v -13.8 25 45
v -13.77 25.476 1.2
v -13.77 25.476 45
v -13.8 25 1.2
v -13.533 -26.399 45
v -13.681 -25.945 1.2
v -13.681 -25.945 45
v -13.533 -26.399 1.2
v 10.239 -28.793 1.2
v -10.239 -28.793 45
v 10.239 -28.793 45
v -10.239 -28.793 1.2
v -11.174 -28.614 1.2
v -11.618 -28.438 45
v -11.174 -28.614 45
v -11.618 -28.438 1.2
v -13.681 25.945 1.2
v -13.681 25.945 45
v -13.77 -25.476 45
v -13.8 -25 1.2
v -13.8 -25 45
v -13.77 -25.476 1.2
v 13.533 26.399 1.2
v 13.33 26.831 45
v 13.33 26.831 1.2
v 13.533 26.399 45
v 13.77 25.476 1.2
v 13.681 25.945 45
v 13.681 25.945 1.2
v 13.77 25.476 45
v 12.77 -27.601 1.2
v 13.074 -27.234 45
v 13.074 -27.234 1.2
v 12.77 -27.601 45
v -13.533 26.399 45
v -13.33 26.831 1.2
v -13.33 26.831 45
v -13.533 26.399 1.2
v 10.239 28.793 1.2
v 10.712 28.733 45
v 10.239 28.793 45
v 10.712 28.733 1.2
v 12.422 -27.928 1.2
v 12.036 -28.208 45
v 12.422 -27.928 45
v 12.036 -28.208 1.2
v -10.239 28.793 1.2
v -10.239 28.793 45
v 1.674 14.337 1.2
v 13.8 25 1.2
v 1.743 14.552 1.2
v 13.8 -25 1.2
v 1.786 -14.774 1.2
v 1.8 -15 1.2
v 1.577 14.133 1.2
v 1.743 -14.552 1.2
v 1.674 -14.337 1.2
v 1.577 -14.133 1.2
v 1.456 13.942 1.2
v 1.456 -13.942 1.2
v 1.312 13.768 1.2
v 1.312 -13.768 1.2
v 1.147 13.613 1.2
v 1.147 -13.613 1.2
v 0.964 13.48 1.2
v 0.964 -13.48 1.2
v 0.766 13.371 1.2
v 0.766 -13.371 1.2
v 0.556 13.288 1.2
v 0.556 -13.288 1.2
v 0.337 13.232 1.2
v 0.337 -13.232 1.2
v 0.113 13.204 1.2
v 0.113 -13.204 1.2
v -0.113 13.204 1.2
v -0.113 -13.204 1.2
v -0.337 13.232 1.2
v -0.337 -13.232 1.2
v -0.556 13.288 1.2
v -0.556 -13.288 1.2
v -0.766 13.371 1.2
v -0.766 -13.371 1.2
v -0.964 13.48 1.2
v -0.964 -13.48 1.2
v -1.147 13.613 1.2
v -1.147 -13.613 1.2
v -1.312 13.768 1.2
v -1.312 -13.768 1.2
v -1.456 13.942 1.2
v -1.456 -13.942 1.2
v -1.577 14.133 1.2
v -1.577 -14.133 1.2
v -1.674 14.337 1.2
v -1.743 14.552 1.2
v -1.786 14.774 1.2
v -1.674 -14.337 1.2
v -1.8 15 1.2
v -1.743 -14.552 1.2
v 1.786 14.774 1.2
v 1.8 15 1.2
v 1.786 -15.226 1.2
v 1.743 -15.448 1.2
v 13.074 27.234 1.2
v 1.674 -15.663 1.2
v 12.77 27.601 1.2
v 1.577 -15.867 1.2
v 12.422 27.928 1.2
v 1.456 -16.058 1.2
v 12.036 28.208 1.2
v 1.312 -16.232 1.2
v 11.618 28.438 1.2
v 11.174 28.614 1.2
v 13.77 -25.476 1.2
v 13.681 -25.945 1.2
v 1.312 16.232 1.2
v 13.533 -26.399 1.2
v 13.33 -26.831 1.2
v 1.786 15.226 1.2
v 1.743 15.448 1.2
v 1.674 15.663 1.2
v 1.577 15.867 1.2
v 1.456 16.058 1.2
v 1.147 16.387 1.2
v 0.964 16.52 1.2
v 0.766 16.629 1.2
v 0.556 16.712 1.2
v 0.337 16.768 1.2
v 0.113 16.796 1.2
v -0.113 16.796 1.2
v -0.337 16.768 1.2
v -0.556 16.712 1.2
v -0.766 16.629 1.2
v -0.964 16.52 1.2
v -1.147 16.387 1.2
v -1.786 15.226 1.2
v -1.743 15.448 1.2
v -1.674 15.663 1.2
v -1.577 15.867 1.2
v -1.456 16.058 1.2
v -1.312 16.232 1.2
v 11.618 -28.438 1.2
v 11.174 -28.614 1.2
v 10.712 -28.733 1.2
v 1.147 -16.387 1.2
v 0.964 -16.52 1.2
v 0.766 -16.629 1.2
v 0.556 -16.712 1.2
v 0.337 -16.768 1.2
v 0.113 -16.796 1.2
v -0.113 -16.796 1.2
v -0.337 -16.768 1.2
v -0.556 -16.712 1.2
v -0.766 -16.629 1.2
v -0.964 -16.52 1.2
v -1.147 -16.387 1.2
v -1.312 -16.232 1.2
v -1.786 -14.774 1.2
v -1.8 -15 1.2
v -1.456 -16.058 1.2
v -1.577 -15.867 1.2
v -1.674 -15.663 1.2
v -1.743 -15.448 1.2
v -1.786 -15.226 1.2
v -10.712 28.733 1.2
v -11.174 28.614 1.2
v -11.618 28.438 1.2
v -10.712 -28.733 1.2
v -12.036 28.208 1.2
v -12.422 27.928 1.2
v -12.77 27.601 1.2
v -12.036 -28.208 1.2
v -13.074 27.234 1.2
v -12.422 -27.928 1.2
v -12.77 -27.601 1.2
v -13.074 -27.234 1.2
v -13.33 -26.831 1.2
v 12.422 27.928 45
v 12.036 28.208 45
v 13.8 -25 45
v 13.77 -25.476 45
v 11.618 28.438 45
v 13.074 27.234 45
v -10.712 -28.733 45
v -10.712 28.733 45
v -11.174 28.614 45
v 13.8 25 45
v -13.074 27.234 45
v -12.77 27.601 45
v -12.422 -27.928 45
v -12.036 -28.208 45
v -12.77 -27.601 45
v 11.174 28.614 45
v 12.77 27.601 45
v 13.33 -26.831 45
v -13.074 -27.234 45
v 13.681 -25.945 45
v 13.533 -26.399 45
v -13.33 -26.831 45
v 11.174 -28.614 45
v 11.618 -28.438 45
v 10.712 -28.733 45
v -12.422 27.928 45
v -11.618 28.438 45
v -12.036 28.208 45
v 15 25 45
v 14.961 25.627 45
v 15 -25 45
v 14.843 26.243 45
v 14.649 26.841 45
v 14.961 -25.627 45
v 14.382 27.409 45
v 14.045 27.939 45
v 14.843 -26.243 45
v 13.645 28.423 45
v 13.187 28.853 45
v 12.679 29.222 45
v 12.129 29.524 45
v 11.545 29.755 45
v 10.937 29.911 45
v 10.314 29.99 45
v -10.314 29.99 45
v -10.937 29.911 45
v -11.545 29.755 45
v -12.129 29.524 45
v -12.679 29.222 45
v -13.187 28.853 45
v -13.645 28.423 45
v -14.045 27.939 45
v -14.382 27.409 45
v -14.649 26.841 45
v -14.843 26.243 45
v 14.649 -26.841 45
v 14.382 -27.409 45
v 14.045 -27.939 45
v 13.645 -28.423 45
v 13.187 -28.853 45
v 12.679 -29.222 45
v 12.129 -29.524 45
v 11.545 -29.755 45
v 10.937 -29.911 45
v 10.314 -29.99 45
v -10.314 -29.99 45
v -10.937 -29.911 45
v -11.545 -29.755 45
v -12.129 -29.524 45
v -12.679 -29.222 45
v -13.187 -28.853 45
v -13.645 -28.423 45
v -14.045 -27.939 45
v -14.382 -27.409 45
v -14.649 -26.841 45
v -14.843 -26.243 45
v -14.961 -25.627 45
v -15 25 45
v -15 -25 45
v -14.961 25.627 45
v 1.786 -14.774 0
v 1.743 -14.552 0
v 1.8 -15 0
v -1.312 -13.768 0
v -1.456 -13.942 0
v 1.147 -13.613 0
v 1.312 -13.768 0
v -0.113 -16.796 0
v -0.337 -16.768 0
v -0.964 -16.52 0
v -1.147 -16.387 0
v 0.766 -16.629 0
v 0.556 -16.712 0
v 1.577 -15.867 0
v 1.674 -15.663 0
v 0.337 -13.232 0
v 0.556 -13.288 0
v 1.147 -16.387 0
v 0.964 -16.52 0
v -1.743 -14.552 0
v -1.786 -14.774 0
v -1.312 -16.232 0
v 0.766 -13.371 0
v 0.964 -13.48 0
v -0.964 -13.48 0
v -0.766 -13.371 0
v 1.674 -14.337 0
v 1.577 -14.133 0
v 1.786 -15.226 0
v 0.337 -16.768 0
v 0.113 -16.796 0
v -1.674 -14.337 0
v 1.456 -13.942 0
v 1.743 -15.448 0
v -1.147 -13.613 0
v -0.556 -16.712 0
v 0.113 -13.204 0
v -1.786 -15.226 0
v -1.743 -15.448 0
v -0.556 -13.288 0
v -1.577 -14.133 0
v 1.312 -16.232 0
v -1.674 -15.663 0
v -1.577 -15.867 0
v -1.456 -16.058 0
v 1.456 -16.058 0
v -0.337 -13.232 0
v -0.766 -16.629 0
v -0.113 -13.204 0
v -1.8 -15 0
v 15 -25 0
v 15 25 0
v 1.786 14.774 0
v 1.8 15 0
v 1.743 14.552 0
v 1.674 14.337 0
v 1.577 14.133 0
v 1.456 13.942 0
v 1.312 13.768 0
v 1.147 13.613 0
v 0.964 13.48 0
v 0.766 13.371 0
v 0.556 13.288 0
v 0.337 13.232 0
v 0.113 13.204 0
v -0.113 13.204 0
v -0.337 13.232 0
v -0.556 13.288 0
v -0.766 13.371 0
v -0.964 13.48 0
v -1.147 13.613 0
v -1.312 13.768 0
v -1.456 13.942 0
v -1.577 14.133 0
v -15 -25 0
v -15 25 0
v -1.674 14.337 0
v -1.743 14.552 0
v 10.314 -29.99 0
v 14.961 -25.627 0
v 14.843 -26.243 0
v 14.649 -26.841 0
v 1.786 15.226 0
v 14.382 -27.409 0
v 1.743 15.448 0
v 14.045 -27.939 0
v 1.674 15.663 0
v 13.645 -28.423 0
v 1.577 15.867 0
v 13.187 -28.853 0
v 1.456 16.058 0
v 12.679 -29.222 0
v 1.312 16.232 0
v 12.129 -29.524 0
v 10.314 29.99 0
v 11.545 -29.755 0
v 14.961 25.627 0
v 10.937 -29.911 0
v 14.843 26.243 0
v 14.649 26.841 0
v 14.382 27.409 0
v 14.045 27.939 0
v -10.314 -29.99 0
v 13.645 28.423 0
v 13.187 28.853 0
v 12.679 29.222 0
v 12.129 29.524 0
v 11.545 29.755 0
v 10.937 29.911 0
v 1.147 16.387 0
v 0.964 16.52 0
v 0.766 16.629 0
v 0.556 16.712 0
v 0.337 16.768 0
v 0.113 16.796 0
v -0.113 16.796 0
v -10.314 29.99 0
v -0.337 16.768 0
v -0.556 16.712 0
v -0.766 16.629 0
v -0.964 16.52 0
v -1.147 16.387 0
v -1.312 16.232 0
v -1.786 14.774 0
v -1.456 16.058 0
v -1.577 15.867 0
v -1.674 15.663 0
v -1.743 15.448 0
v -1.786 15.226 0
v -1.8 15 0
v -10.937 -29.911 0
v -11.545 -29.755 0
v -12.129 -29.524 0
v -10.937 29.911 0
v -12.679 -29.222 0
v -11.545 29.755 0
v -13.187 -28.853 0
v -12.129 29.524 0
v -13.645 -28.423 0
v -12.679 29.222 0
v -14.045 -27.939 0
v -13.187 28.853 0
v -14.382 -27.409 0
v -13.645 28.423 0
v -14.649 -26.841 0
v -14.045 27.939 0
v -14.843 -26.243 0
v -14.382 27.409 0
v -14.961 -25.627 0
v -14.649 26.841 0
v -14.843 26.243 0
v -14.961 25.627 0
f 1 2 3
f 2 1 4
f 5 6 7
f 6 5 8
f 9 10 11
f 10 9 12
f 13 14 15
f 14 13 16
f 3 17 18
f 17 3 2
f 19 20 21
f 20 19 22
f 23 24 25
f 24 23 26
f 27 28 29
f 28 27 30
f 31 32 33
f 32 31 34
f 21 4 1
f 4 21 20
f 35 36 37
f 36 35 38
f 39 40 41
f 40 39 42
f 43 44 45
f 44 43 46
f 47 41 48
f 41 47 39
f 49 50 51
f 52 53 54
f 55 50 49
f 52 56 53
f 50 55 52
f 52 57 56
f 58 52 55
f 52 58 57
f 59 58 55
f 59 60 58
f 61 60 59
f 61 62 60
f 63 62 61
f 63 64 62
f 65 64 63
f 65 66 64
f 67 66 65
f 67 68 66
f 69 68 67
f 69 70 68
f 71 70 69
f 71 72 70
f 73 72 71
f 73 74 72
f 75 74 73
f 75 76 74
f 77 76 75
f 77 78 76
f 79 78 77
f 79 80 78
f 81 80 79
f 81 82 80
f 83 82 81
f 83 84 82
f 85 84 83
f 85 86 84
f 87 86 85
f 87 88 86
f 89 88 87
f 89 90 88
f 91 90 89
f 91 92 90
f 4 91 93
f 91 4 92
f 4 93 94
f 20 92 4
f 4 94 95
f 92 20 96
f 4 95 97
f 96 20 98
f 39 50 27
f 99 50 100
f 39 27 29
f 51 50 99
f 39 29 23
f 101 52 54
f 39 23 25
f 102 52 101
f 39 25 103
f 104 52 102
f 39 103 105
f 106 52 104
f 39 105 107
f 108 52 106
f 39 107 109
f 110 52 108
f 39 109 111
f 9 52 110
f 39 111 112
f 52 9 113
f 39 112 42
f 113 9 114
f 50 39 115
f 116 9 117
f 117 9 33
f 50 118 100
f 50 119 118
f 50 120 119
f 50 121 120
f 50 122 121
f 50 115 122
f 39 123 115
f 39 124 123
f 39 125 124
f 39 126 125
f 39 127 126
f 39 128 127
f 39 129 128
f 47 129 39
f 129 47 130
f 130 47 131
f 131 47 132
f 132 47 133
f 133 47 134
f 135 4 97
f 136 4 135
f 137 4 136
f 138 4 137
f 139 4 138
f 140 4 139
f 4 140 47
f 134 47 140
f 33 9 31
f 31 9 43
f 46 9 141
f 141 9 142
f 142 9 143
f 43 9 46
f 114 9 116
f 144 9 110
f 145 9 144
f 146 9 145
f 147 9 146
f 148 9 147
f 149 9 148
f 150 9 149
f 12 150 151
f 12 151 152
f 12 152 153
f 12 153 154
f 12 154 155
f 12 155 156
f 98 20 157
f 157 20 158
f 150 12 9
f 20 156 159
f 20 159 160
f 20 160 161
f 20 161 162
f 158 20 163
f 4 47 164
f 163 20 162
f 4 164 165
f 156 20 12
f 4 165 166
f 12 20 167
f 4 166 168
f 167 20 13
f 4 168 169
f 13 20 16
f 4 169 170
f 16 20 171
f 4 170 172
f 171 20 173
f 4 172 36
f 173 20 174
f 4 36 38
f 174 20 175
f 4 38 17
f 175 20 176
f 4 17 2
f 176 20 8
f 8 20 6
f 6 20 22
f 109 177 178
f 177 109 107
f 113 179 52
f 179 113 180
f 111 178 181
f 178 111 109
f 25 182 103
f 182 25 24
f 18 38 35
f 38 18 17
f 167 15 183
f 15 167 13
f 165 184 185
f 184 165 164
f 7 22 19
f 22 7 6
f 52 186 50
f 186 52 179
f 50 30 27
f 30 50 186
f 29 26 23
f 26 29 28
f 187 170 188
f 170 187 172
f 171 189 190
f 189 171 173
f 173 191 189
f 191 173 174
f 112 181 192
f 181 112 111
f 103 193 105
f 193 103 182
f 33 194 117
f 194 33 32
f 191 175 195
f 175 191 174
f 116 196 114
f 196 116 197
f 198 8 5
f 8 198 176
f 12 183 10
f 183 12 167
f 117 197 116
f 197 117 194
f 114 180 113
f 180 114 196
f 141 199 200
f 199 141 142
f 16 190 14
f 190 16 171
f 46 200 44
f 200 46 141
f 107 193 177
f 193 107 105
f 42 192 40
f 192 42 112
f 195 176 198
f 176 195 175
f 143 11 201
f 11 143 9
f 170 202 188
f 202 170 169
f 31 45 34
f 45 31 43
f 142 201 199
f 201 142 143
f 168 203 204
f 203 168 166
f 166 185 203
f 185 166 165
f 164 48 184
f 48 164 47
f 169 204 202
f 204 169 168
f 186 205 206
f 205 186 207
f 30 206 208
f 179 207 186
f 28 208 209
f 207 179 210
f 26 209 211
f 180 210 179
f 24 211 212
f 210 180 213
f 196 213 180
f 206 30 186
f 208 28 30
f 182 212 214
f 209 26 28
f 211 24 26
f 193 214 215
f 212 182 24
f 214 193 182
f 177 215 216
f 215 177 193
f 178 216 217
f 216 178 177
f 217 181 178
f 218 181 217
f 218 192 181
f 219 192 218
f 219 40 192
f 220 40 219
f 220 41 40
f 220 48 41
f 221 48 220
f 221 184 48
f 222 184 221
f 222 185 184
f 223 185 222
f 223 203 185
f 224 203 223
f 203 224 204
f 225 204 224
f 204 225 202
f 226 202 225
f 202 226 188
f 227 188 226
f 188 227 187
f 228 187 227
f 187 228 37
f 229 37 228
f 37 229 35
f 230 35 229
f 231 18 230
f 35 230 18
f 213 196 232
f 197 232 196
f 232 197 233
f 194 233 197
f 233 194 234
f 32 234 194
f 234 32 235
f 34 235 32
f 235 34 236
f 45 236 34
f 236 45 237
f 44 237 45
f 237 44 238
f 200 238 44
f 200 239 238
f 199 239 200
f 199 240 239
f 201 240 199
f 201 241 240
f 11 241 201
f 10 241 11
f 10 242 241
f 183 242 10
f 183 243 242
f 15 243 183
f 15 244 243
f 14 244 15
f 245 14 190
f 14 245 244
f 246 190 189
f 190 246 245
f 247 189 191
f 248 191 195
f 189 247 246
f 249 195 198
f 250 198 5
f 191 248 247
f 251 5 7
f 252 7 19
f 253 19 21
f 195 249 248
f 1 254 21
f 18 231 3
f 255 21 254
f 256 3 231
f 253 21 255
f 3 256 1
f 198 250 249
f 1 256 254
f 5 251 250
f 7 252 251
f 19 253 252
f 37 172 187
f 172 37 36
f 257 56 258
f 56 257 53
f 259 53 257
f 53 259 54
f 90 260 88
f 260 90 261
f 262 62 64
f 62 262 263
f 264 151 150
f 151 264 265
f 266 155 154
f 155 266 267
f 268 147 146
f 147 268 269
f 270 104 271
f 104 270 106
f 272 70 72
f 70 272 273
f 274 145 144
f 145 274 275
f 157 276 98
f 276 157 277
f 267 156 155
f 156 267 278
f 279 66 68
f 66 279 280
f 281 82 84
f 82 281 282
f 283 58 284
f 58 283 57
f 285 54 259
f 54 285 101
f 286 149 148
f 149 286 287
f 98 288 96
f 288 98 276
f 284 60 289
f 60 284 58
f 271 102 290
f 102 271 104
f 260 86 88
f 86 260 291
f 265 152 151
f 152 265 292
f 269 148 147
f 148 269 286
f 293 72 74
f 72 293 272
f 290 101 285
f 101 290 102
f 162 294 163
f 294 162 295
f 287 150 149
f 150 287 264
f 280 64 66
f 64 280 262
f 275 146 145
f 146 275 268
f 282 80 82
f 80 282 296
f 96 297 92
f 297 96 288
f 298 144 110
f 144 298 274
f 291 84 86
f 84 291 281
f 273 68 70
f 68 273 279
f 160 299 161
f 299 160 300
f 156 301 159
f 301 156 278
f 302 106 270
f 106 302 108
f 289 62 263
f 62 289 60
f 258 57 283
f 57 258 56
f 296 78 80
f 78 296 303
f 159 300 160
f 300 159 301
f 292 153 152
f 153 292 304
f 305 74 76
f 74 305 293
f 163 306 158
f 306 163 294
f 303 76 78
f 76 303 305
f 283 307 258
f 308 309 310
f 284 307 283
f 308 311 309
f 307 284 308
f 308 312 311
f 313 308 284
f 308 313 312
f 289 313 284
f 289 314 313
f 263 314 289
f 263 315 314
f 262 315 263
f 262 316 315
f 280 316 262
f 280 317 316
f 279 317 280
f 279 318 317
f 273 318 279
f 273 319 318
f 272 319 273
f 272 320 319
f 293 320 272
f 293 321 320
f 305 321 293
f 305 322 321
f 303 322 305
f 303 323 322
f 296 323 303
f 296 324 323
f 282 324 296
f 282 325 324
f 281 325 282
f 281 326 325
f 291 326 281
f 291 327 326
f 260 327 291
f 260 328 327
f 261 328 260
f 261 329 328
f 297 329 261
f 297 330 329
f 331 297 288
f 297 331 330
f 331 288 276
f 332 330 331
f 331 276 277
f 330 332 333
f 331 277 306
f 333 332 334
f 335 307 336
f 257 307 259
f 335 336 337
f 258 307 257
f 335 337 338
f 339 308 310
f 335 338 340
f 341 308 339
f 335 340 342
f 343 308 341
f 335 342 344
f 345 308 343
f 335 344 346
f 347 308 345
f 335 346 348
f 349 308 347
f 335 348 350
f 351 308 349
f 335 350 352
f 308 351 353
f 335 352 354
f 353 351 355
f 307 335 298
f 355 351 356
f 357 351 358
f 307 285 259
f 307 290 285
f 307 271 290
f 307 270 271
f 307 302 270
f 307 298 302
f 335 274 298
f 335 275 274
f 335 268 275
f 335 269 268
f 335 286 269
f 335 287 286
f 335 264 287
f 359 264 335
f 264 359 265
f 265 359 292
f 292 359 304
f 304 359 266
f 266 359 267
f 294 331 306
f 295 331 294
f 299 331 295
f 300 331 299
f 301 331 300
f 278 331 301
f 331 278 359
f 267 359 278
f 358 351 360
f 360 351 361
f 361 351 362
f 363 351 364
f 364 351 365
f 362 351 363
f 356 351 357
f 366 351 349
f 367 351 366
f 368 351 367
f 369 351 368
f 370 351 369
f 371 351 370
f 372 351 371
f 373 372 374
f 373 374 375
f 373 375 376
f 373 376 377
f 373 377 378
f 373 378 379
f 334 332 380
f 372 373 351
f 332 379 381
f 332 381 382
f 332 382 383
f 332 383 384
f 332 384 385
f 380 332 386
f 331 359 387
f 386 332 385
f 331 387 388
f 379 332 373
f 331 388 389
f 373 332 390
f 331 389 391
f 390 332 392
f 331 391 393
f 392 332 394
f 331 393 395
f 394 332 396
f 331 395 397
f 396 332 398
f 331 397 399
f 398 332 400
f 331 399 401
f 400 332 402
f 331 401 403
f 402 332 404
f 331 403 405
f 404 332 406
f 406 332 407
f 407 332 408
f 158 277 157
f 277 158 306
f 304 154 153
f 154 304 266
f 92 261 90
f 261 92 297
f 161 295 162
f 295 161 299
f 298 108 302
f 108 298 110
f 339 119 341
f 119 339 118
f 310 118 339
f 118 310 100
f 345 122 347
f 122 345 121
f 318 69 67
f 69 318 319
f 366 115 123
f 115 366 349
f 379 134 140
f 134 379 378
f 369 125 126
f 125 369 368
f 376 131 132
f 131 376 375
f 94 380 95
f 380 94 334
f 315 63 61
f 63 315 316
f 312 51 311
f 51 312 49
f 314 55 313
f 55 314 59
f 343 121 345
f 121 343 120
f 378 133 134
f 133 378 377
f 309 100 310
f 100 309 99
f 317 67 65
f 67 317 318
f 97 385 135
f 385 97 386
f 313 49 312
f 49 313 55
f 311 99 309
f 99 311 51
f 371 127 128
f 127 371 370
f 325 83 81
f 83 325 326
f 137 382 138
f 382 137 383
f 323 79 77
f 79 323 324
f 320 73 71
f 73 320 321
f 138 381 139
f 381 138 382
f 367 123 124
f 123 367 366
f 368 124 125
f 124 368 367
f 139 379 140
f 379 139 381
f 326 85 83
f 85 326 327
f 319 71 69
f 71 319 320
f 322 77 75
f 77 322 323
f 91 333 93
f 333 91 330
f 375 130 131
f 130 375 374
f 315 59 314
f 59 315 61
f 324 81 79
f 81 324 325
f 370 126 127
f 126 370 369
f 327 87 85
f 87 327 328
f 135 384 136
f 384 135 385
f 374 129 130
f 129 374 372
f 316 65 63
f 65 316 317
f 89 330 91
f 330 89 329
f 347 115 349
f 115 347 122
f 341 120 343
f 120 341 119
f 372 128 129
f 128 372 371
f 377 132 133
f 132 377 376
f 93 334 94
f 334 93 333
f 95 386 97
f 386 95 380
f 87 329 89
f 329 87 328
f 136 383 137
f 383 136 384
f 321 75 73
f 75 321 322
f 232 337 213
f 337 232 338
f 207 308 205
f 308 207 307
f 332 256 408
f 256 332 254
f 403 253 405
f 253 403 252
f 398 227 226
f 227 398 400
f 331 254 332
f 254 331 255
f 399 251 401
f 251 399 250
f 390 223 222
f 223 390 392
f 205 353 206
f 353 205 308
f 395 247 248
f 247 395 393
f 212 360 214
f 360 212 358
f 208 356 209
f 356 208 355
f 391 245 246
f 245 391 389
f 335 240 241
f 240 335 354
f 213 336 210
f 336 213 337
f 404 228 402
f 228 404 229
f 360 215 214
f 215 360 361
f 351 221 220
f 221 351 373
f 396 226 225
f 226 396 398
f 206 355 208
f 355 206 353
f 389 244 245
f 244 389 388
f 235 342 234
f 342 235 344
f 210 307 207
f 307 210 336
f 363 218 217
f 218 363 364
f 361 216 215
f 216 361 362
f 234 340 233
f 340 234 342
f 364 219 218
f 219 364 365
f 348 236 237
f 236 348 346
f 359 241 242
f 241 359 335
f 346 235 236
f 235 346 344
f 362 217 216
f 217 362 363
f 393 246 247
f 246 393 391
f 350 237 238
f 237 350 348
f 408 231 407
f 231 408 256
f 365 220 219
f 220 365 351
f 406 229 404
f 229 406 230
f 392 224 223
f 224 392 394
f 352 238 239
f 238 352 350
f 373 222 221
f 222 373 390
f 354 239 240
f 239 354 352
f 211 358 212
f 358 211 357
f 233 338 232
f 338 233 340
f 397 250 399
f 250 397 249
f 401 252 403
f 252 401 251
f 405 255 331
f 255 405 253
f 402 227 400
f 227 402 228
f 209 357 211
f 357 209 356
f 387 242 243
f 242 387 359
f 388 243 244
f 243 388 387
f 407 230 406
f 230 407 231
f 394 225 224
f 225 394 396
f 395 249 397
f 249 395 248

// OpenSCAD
$fn = 50;


difference() {
	union() {
		hull() {
			translate(v = [-10.0000000000, 25.0000000000, 0]) {
				cylinder(h = 45, r = 5);
			}
			translate(v = [10.0000000000, 25.0000000000, 0]) {
				cylinder(h = 45, r = 5);
			}
			translate(v = [-10.0000000000, -25.0000000000, 0]) {
				cylinder(h = 45, r = 5);
			}
			translate(v = [10.0000000000, -25.0000000000, 0]) {
				cylinder(h = 45, r = 5);
			}
		}
	}
	union() {
		translate(v = [0, 0, 1.2000000000]) {
			hull() {
				translate(v = [-10.0000000000, 25.0000000000, 0]) {
					cylinder(h = 43.8000000000, r = 3.8000000000);
				}
				translate(v = [10.0000000000, 25.0000000000, 0]) {
					cylinder(h = 43.8000000000, r = 3.8000000000);
				}
				translate(v = [-10.0000000000, -25.0000000000, 0]) {
					cylinder(h = 43.8000000000, r = 3.8000000000);
				}
				translate(v = [10.0000000000, -25.0000000000, 0]) {
					cylinder(h = 43.8000000000, r = 3.8000000000);
				}
			}
		}
		#translate(v = [0.0000000000, -15.0000000000, 0]) {
			cylinder(h = 1.2000000000, r = 1.8000000000);
		}
		#translate(v = [0.0000000000, 15.0000000000, 0]) {
			cylinder(h = 1.2000000000, r = 1.8000000000);
		}
	}
}
